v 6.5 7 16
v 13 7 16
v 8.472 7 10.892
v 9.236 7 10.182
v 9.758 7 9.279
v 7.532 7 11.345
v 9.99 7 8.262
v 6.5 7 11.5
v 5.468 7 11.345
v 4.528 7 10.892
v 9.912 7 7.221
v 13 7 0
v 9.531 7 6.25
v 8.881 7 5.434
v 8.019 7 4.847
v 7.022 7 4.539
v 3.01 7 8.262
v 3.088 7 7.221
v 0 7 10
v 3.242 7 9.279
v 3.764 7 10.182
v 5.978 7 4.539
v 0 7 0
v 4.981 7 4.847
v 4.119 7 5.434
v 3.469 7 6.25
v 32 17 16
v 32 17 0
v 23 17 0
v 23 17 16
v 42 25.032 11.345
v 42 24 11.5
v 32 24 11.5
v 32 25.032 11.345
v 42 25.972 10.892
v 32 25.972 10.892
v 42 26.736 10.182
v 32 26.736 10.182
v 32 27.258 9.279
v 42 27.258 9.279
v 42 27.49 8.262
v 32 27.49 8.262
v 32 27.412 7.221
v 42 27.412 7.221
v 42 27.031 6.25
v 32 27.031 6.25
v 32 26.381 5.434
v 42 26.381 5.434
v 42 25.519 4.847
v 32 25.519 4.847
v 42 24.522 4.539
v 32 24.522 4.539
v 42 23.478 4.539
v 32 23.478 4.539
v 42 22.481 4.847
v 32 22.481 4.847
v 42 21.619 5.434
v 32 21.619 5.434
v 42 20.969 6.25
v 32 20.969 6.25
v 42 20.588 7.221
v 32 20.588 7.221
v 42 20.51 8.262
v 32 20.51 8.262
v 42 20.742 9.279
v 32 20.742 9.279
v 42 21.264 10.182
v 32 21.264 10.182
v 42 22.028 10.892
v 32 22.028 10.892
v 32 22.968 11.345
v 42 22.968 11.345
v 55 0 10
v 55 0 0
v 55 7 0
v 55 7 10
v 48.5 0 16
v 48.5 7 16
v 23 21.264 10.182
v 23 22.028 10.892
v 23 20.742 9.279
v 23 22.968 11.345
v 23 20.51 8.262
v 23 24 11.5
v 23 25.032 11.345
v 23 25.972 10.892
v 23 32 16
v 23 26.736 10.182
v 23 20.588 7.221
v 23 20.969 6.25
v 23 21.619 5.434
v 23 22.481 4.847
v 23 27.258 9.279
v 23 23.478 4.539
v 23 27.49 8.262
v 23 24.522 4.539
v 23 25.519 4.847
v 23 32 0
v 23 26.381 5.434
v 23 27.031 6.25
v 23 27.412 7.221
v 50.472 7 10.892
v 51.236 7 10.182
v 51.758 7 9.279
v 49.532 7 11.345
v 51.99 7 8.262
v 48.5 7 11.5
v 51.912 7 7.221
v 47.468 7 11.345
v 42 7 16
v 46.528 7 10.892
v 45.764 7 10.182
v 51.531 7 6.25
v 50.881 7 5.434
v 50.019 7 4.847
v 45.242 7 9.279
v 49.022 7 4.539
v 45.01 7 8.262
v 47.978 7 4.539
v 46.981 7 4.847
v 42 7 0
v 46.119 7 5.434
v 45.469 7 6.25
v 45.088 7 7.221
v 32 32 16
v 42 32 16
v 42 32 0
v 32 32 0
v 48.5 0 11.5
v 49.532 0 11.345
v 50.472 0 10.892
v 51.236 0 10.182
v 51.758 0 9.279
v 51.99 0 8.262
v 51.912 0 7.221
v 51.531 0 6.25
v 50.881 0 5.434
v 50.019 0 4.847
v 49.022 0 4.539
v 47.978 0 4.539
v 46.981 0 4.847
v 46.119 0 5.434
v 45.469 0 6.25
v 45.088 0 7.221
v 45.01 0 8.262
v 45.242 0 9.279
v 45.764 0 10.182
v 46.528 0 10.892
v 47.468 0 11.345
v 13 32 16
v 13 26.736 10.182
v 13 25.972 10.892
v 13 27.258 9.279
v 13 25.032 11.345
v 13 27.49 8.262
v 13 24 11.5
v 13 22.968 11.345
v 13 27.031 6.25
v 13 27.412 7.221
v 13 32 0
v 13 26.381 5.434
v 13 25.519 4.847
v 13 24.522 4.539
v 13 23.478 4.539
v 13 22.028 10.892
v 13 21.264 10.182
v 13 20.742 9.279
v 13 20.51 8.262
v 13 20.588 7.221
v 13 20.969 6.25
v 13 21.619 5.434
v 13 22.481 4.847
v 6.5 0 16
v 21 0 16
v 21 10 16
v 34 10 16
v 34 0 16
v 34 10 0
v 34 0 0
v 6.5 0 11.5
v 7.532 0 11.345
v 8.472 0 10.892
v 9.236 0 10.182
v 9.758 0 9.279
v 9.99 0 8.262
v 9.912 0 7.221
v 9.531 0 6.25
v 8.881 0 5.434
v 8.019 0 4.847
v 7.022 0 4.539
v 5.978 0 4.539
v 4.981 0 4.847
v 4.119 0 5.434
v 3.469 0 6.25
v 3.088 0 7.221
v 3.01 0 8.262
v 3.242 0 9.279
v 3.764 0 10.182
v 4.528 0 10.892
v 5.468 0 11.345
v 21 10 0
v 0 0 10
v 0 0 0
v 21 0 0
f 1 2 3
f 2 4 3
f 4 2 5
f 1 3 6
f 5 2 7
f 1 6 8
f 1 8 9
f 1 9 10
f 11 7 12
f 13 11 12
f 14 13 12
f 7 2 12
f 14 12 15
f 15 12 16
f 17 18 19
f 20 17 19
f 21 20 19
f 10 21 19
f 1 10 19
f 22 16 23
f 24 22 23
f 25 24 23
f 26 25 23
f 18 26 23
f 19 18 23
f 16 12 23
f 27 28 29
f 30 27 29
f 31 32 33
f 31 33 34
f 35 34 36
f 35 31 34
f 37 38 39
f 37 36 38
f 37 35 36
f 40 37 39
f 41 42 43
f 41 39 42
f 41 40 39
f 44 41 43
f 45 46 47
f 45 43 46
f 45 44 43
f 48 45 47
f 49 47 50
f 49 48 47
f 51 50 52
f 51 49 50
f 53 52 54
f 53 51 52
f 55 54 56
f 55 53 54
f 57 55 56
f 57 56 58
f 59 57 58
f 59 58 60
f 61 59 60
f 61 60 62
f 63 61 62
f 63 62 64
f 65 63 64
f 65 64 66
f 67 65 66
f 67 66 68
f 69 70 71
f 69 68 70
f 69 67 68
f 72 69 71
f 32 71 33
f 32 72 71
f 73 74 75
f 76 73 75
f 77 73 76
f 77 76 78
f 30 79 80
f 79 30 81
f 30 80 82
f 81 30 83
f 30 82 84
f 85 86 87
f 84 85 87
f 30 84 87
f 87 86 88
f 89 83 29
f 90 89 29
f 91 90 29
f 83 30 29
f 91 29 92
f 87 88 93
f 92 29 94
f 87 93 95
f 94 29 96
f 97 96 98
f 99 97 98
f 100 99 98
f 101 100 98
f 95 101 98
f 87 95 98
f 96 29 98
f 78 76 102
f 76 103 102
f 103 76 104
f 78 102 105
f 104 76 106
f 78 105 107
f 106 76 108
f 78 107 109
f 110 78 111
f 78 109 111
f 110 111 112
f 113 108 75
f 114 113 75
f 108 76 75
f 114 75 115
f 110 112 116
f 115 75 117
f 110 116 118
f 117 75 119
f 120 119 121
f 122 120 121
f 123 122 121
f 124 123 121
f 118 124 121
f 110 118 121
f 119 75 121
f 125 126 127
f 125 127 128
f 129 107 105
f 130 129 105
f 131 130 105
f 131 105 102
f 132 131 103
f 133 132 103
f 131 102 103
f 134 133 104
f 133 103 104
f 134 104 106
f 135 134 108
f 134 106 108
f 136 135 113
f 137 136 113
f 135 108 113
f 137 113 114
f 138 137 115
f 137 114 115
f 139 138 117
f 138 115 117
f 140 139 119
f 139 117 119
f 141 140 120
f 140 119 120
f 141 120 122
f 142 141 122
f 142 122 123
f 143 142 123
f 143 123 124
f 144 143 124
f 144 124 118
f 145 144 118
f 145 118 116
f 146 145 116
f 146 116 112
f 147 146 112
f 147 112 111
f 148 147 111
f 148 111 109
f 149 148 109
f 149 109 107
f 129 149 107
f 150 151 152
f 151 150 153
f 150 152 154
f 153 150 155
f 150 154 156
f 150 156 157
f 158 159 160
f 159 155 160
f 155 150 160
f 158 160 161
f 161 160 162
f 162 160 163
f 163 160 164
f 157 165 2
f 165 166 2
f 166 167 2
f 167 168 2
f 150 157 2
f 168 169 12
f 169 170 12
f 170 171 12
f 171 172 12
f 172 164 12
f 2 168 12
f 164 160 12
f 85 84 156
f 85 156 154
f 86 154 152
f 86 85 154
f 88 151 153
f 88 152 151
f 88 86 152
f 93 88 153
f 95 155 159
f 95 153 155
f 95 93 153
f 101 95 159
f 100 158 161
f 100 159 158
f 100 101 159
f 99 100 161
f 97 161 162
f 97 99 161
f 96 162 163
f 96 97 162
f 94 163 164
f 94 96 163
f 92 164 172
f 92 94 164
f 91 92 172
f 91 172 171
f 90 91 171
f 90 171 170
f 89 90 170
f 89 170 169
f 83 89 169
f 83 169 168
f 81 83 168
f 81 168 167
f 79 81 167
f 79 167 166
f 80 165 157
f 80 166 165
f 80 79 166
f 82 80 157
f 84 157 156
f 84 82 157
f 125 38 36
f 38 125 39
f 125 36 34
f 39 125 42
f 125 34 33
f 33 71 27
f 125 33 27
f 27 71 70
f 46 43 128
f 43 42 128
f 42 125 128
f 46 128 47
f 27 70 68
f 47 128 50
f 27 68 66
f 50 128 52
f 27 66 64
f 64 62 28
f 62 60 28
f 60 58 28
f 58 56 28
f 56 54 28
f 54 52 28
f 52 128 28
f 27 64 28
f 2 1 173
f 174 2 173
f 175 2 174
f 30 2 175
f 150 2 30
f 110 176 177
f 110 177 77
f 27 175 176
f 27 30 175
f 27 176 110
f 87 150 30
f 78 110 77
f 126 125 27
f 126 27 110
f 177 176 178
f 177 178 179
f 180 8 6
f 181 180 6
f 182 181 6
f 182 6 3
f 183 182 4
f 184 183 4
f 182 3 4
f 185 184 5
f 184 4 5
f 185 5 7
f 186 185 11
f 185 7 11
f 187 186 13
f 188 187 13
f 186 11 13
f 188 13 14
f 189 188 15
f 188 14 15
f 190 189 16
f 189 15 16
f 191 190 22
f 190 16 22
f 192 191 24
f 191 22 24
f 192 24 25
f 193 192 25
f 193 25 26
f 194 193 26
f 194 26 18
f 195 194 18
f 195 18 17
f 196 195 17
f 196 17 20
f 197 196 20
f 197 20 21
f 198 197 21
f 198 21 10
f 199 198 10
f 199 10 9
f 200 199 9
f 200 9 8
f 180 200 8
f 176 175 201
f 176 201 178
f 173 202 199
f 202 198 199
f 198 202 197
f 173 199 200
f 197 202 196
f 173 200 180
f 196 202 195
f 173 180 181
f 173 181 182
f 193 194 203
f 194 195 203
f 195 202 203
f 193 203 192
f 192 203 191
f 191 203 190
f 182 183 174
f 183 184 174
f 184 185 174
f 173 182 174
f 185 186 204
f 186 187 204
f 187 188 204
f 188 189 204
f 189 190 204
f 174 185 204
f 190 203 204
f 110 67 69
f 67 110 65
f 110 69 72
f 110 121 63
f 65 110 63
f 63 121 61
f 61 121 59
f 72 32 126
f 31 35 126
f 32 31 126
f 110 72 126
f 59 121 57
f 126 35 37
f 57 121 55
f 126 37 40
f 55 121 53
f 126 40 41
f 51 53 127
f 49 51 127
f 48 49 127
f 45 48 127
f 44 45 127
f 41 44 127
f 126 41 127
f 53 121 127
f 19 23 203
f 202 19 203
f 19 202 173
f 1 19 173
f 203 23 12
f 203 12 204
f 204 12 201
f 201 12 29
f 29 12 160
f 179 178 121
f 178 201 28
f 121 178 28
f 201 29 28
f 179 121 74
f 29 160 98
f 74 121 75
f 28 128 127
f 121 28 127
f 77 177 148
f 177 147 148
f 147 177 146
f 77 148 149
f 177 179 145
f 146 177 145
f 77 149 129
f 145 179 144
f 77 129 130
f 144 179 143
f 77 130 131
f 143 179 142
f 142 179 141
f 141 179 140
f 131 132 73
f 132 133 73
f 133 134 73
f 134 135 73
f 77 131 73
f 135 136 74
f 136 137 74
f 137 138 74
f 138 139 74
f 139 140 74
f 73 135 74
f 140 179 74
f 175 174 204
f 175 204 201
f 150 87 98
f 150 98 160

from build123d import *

# Parameters (mm, degrees)
BOSS_EXTRUDE1_DEPTH     = 16
SKETCH8_R               = 3.5
CUT_EXTRUDE1_DEPTH      = 16
SKETCH11_R              = 3.5
CUT_EXTRUDE2_DEPTH      = 16
CUT_EXTRUDE3_DEPTH      = 56.172456897
CUT_EXTRUDE3_DEPTH_BACK = 56.172456897
SKETCH12_R              = 3.5
CUT_EXTRUDE4_DEPTH      = 63.497999968
CUT_EXTRUDE4_DEPTH_BACK = 63.497999968
CUT_EXTRUDE5_DEPTH      = 63.497999968
CUT_EXTRUDE5_DEPTH_BACK = 63.497999968


with BuildPart() as part:
    # Sketch3 → Boss-Extrude1 (new body)
    with BuildSketch(Plane.XY):
        Polygon((0, 0), (21, 0), (21, 10), (34, 10), (34, 0), (55, 0), (55, 7), (42, 7), (42, 32), (32, 32), (32, 17), (23, 17), (23, 32), (13, 32), (13, 7), (0, 7), align=None)
    extrude(amount=BOSS_EXTRUDE1_DEPTH)

    # Sketch8 → Cut-Extrude1 (cut)
    with BuildSketch(Plane(origin=(0, 7, 0), x_dir=(1, 0, 0), z_dir=(0, 1, 0))):
        with Locations(Location((6.5, -8, 0), (0, 0, 270))):
            Circle(SKETCH8_R)
    extrude(amount=-CUT_EXTRUDE1_DEPTH, mode=Mode.SUBTRACT)

    # Sketch11 → Cut-Extrude2 (cut)
    with BuildSketch(Plane(origin=(0, 7, 0), x_dir=(1, 0, 0), z_dir=(0, 1, 0))):
        with Locations(Location((48.5, -8, 0), (0, 0, 270))):
            Circle(SKETCH11_R)
    extrude(amount=-CUT_EXTRUDE2_DEPTH, mode=Mode.SUBTRACT)

    # Sketch12 → Cut-Extrude3 (cut, two sides: drawn at the far end of the back side and taken through both)
    with BuildSketch(Plane.ZY.offset(-13).offset(-CUT_EXTRUDE3_DEPTH_BACK)):
        with Locations((8, 24)):
            Circle(SKETCH12_R)
    extrude(amount=CUT_EXTRUDE3_DEPTH + CUT_EXTRUDE3_DEPTH_BACK, mode=Mode.SUBTRACT)

    # Sketch13 → Cut-Extrude4 (cut, two sides: drawn at the far end of the back side and taken through both)
    with BuildSketch(Plane(origin=(0, 7, 0), x_dir=(1, 0, 0), z_dir=(0, 1, 0)).offset(-CUT_EXTRUDE4_DEPTH_BACK)):
        Polygon((6.5, -16), (0, -16), (0, -10), align=None)
    extrude(amount=CUT_EXTRUDE4_DEPTH + CUT_EXTRUDE4_DEPTH_BACK, mode=Mode.SUBTRACT)

    # Sketch14 → Cut-Extrude5 (cut, two sides: drawn at the far end of the back side and taken through both)
    with BuildSketch(Plane(origin=(0, 7, 0), x_dir=(1, 0, 0), z_dir=(0, 1, 0)).offset(-CUT_EXTRUDE5_DEPTH_BACK)):
        Polygon((55, -16), (55, -10), (48.5, -16), align=None)
    extrude(amount=CUT_EXTRUDE5_DEPTH + CUT_EXTRUDE5_DEPTH_BACK, mode=Mode.SUBTRACT)


solid = part.part
